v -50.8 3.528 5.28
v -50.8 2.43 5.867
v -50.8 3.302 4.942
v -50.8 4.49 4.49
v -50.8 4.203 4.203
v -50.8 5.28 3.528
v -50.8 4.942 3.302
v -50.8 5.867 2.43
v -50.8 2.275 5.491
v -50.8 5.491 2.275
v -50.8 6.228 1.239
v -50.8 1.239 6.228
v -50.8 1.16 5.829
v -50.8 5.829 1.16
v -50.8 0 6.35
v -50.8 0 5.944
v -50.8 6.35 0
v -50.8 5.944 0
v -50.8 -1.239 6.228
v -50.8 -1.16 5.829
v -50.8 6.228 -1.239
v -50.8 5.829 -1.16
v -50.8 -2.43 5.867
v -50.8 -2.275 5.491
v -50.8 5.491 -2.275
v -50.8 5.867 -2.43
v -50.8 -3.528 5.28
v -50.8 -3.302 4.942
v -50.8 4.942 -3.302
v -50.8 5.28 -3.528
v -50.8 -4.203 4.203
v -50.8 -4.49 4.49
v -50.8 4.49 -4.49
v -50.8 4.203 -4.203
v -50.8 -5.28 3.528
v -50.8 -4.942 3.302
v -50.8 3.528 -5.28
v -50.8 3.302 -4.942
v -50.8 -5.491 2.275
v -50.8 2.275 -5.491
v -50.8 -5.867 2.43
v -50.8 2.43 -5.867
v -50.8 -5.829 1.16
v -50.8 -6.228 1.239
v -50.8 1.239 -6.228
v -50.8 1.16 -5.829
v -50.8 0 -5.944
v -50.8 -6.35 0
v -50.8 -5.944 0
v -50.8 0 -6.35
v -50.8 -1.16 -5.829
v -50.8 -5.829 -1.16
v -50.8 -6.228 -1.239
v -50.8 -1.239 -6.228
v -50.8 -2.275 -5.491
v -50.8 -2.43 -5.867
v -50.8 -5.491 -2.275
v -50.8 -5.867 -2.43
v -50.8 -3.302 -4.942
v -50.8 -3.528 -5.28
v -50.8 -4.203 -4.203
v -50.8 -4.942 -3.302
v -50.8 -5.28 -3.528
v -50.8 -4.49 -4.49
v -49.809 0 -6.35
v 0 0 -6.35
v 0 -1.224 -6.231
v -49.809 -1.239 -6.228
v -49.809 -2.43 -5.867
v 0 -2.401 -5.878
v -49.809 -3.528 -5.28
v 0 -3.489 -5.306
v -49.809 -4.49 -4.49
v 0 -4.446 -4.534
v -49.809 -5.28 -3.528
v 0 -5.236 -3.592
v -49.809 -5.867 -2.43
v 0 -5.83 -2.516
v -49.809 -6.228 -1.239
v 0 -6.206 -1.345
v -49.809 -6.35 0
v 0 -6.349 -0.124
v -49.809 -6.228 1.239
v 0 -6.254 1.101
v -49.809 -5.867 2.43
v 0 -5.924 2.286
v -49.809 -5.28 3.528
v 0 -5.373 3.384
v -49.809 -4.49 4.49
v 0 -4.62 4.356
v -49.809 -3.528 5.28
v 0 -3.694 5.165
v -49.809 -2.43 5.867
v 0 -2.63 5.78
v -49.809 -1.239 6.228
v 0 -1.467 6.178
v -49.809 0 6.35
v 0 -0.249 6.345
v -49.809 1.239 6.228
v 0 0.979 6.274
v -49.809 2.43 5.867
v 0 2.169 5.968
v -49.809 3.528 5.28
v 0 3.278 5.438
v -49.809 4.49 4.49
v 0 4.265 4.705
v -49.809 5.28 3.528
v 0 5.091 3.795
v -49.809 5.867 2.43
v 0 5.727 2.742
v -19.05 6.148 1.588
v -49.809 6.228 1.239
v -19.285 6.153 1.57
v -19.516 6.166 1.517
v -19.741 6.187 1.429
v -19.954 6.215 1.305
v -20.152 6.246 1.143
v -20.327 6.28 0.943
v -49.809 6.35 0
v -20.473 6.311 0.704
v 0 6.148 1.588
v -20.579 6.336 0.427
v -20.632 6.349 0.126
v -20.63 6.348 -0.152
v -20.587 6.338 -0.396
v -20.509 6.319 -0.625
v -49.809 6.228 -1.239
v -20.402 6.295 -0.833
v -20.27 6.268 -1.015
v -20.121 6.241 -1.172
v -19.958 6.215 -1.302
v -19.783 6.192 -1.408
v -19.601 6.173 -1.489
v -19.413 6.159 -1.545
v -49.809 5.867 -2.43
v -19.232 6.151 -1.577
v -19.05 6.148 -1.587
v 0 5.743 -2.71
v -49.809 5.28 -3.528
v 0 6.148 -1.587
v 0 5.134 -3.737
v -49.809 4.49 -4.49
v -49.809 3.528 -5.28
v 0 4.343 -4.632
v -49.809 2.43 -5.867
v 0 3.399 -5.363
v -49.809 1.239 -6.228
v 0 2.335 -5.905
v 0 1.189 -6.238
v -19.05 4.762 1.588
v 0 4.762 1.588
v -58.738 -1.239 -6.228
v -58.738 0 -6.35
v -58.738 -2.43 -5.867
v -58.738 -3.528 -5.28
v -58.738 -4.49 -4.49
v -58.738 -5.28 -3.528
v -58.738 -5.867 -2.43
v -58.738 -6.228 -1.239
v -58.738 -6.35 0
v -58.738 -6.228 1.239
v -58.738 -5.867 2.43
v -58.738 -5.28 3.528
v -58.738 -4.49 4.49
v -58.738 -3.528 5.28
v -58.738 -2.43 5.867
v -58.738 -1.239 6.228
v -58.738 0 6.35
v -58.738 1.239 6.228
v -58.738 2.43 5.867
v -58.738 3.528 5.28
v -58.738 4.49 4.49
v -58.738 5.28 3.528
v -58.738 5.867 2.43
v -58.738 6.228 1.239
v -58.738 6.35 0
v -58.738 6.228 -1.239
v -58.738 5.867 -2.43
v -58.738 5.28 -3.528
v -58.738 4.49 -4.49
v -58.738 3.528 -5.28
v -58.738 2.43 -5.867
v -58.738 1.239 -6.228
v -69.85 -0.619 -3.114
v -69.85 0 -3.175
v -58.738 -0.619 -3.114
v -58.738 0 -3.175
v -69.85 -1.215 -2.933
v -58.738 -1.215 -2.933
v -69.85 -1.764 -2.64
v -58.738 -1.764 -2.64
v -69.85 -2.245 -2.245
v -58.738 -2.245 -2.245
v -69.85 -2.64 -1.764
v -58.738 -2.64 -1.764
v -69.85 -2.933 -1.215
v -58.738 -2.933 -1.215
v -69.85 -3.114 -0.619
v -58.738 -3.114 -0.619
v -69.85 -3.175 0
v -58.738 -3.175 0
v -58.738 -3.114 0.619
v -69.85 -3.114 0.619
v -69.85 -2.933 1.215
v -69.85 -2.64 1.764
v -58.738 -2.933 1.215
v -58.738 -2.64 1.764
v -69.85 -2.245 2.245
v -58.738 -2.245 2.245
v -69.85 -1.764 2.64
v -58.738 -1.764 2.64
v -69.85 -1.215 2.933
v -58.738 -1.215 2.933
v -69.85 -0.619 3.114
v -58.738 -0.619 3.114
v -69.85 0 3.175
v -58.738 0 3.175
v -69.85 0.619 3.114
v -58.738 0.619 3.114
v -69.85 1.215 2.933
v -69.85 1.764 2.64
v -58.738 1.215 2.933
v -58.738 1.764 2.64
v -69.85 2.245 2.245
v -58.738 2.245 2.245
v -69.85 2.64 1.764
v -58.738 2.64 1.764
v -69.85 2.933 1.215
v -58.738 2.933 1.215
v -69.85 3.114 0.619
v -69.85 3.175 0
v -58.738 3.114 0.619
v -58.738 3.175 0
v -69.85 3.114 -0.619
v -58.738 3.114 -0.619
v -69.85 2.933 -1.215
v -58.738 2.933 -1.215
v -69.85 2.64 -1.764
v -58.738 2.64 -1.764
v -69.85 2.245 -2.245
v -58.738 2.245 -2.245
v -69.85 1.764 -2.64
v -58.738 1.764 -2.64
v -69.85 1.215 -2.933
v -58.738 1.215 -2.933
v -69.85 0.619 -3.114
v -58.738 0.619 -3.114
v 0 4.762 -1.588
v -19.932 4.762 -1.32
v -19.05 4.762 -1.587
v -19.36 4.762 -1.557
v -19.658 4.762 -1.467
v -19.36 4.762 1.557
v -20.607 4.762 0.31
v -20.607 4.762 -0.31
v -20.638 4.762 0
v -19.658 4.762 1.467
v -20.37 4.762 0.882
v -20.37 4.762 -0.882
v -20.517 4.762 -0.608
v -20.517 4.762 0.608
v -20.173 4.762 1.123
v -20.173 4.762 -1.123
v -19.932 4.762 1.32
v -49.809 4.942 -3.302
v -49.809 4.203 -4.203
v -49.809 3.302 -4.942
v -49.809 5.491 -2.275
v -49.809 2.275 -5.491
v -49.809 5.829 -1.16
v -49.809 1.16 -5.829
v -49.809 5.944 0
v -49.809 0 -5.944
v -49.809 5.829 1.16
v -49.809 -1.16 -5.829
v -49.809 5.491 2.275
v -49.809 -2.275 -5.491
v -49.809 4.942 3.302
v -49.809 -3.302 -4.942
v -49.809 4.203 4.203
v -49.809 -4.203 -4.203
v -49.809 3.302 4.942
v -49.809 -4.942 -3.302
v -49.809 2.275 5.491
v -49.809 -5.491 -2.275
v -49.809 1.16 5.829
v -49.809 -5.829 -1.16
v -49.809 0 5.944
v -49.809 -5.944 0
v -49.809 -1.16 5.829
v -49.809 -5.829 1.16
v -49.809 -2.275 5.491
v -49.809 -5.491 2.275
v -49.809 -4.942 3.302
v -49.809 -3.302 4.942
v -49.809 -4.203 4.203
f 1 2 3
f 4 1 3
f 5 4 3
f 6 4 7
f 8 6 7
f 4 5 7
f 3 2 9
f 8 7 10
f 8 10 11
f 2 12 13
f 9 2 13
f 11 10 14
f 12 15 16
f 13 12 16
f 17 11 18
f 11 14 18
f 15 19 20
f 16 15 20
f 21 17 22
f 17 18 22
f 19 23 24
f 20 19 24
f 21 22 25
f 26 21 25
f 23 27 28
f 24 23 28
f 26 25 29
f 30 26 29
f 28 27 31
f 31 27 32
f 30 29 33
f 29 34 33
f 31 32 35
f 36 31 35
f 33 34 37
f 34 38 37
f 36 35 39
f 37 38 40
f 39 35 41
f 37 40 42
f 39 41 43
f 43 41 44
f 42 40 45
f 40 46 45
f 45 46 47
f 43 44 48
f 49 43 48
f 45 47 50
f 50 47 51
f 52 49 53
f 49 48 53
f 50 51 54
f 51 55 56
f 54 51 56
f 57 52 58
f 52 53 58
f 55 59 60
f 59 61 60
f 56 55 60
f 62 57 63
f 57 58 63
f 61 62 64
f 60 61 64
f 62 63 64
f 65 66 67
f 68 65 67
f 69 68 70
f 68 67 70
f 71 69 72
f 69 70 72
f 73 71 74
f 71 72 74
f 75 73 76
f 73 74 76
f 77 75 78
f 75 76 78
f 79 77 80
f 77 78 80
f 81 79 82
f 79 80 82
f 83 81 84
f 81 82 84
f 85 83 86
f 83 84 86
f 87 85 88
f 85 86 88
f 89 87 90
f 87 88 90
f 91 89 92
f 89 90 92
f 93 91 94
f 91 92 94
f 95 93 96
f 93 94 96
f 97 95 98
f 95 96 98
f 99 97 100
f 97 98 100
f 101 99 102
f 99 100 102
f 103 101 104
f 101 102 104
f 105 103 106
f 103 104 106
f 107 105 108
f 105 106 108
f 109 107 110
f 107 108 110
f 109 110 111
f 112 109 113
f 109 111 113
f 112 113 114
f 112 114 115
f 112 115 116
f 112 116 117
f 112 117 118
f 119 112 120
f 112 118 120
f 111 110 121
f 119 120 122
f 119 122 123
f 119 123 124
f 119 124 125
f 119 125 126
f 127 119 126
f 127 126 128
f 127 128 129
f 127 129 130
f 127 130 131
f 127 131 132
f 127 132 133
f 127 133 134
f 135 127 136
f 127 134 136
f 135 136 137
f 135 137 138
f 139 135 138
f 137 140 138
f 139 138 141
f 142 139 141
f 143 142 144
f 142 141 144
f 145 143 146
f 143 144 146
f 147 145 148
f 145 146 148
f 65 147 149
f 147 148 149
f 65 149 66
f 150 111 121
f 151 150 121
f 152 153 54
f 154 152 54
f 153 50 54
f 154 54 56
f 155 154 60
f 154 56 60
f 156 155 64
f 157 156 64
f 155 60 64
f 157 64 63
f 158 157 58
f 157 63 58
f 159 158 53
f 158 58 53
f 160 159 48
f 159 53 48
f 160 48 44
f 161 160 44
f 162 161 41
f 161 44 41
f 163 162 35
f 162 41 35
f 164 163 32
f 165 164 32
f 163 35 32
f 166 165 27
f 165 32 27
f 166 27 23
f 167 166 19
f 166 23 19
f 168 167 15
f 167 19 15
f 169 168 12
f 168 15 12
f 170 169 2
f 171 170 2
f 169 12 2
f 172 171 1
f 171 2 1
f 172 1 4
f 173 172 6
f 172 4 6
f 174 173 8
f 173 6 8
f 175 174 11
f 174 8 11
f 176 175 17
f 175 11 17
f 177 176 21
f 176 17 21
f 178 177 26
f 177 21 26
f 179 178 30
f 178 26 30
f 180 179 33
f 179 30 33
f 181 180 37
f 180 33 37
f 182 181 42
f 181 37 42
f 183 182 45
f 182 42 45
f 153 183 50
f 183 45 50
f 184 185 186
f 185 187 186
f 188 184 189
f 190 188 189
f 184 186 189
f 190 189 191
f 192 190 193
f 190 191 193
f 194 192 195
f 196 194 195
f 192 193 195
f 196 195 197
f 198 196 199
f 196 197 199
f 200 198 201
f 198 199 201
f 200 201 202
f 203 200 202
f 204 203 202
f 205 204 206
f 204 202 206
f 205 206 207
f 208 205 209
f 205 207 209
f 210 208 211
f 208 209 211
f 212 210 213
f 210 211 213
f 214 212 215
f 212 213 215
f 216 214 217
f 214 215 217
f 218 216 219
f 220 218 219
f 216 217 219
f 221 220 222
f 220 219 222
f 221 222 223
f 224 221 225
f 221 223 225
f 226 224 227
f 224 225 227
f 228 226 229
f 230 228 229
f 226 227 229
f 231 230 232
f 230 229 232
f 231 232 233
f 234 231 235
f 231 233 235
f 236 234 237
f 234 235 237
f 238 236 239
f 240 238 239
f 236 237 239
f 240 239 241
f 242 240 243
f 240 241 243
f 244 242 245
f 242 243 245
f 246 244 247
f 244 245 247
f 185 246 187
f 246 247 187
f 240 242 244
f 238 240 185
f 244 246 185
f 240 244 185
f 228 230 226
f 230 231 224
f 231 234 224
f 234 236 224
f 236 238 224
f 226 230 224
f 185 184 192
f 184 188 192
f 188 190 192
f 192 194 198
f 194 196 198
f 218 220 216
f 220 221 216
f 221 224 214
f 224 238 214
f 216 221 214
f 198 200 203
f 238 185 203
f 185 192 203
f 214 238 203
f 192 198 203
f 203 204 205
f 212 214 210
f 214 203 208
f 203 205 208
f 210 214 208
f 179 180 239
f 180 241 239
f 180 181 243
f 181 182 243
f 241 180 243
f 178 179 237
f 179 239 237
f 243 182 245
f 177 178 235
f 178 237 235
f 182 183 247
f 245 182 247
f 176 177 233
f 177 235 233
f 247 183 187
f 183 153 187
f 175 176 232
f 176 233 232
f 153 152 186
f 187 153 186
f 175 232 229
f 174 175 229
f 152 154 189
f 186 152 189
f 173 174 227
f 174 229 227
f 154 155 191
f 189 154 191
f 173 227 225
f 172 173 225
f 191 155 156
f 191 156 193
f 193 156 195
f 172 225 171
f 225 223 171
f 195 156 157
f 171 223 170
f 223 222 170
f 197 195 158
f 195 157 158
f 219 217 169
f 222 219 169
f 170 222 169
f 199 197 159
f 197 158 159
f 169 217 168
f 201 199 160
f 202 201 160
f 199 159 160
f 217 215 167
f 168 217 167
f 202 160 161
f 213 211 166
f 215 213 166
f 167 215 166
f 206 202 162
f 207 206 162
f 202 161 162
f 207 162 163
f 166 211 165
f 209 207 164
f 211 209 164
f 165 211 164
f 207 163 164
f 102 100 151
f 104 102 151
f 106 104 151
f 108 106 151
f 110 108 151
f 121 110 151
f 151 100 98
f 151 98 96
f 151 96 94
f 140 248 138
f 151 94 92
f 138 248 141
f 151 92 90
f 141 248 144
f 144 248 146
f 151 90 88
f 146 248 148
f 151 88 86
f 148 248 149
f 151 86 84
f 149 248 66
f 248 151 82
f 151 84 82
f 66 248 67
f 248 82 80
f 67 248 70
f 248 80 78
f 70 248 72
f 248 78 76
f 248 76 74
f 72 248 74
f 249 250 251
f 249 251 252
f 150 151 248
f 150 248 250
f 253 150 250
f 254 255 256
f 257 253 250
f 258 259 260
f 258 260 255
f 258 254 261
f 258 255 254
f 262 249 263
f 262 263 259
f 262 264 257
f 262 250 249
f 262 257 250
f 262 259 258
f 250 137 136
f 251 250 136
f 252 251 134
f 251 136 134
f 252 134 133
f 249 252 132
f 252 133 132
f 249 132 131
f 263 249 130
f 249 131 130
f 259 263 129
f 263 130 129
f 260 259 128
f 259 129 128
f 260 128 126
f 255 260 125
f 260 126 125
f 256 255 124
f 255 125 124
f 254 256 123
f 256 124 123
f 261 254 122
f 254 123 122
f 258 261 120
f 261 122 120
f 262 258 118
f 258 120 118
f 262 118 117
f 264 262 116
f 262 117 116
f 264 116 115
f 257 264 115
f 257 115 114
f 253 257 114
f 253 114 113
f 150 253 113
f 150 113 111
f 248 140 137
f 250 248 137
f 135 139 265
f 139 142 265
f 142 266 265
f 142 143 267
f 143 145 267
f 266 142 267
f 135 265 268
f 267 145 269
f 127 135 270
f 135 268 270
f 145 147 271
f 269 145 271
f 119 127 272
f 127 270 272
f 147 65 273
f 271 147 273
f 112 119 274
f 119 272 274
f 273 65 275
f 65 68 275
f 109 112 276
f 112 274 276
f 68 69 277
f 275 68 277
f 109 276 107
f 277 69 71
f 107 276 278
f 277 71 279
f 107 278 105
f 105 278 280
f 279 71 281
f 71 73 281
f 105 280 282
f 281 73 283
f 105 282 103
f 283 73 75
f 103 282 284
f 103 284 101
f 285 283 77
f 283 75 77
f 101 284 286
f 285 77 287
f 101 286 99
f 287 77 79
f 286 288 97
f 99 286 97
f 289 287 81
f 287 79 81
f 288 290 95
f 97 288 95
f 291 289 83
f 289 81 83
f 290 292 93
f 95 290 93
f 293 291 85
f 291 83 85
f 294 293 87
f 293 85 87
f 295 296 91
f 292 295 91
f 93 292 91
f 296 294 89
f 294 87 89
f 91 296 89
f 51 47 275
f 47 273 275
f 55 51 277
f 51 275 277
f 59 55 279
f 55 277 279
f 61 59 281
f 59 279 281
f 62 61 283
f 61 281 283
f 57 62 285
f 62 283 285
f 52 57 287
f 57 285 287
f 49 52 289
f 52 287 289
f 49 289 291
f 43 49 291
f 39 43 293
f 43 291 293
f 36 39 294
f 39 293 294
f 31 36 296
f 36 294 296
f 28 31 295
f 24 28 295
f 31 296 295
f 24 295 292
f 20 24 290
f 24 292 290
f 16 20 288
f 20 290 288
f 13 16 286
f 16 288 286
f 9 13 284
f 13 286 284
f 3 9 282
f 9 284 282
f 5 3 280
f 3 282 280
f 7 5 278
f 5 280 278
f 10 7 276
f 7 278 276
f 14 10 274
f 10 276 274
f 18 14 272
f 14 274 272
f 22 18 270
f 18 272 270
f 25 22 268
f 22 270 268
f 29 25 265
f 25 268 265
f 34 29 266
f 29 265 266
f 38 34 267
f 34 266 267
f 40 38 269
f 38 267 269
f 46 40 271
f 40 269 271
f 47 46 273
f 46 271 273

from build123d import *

# Parameters (mm, degrees)
CUT_EXTRUDE1_DEPTH = 1.5875


with BuildPart() as part:
    # Sketch1 → Revolve1 (revolve)
    with BuildSketch(Plane.XY, mode=Mode.PRIVATE) as revolve1_sk:
        Polygon((-69.85, 0), (-69.85, 3.175), (-58.7375, 3.175), (-58.7375, 6.35), (-50.8, 6.35), (-50.8, 5.9436), (-49.8094, 5.9436), (-49.8094, 6.35), (0, 6.35), (0, 0), align=None)
    revolve(revolve1_sk.sketch.rotate(Axis((0, 0, 0), (-1, 0, 0)), 90), axis=Axis((0, 0, 0), (-1, 0, 0)))

    # Sketch2 → Cut-Extrude1 (cut)
    with BuildSketch(Plane(origin=(0, 6.35, 0), x_dir=(-1, 0, 0), z_dir=(0, 1, 0))):
        with BuildLine():
            Line((19.05, 1.5875), (0, 1.5875))
            Line((0, 1.5875), (0, -1.5875))
            Line((0, -1.5875), (19.05, -1.5875))
            ThreePointArc((19.05, -1.5875), (20.6375, 0), (19.05, 1.5875))
        make_face()
    extrude(amount=-CUT_EXTRUDE1_DEPTH, mode=Mode.SUBTRACT)


solid = part.part
